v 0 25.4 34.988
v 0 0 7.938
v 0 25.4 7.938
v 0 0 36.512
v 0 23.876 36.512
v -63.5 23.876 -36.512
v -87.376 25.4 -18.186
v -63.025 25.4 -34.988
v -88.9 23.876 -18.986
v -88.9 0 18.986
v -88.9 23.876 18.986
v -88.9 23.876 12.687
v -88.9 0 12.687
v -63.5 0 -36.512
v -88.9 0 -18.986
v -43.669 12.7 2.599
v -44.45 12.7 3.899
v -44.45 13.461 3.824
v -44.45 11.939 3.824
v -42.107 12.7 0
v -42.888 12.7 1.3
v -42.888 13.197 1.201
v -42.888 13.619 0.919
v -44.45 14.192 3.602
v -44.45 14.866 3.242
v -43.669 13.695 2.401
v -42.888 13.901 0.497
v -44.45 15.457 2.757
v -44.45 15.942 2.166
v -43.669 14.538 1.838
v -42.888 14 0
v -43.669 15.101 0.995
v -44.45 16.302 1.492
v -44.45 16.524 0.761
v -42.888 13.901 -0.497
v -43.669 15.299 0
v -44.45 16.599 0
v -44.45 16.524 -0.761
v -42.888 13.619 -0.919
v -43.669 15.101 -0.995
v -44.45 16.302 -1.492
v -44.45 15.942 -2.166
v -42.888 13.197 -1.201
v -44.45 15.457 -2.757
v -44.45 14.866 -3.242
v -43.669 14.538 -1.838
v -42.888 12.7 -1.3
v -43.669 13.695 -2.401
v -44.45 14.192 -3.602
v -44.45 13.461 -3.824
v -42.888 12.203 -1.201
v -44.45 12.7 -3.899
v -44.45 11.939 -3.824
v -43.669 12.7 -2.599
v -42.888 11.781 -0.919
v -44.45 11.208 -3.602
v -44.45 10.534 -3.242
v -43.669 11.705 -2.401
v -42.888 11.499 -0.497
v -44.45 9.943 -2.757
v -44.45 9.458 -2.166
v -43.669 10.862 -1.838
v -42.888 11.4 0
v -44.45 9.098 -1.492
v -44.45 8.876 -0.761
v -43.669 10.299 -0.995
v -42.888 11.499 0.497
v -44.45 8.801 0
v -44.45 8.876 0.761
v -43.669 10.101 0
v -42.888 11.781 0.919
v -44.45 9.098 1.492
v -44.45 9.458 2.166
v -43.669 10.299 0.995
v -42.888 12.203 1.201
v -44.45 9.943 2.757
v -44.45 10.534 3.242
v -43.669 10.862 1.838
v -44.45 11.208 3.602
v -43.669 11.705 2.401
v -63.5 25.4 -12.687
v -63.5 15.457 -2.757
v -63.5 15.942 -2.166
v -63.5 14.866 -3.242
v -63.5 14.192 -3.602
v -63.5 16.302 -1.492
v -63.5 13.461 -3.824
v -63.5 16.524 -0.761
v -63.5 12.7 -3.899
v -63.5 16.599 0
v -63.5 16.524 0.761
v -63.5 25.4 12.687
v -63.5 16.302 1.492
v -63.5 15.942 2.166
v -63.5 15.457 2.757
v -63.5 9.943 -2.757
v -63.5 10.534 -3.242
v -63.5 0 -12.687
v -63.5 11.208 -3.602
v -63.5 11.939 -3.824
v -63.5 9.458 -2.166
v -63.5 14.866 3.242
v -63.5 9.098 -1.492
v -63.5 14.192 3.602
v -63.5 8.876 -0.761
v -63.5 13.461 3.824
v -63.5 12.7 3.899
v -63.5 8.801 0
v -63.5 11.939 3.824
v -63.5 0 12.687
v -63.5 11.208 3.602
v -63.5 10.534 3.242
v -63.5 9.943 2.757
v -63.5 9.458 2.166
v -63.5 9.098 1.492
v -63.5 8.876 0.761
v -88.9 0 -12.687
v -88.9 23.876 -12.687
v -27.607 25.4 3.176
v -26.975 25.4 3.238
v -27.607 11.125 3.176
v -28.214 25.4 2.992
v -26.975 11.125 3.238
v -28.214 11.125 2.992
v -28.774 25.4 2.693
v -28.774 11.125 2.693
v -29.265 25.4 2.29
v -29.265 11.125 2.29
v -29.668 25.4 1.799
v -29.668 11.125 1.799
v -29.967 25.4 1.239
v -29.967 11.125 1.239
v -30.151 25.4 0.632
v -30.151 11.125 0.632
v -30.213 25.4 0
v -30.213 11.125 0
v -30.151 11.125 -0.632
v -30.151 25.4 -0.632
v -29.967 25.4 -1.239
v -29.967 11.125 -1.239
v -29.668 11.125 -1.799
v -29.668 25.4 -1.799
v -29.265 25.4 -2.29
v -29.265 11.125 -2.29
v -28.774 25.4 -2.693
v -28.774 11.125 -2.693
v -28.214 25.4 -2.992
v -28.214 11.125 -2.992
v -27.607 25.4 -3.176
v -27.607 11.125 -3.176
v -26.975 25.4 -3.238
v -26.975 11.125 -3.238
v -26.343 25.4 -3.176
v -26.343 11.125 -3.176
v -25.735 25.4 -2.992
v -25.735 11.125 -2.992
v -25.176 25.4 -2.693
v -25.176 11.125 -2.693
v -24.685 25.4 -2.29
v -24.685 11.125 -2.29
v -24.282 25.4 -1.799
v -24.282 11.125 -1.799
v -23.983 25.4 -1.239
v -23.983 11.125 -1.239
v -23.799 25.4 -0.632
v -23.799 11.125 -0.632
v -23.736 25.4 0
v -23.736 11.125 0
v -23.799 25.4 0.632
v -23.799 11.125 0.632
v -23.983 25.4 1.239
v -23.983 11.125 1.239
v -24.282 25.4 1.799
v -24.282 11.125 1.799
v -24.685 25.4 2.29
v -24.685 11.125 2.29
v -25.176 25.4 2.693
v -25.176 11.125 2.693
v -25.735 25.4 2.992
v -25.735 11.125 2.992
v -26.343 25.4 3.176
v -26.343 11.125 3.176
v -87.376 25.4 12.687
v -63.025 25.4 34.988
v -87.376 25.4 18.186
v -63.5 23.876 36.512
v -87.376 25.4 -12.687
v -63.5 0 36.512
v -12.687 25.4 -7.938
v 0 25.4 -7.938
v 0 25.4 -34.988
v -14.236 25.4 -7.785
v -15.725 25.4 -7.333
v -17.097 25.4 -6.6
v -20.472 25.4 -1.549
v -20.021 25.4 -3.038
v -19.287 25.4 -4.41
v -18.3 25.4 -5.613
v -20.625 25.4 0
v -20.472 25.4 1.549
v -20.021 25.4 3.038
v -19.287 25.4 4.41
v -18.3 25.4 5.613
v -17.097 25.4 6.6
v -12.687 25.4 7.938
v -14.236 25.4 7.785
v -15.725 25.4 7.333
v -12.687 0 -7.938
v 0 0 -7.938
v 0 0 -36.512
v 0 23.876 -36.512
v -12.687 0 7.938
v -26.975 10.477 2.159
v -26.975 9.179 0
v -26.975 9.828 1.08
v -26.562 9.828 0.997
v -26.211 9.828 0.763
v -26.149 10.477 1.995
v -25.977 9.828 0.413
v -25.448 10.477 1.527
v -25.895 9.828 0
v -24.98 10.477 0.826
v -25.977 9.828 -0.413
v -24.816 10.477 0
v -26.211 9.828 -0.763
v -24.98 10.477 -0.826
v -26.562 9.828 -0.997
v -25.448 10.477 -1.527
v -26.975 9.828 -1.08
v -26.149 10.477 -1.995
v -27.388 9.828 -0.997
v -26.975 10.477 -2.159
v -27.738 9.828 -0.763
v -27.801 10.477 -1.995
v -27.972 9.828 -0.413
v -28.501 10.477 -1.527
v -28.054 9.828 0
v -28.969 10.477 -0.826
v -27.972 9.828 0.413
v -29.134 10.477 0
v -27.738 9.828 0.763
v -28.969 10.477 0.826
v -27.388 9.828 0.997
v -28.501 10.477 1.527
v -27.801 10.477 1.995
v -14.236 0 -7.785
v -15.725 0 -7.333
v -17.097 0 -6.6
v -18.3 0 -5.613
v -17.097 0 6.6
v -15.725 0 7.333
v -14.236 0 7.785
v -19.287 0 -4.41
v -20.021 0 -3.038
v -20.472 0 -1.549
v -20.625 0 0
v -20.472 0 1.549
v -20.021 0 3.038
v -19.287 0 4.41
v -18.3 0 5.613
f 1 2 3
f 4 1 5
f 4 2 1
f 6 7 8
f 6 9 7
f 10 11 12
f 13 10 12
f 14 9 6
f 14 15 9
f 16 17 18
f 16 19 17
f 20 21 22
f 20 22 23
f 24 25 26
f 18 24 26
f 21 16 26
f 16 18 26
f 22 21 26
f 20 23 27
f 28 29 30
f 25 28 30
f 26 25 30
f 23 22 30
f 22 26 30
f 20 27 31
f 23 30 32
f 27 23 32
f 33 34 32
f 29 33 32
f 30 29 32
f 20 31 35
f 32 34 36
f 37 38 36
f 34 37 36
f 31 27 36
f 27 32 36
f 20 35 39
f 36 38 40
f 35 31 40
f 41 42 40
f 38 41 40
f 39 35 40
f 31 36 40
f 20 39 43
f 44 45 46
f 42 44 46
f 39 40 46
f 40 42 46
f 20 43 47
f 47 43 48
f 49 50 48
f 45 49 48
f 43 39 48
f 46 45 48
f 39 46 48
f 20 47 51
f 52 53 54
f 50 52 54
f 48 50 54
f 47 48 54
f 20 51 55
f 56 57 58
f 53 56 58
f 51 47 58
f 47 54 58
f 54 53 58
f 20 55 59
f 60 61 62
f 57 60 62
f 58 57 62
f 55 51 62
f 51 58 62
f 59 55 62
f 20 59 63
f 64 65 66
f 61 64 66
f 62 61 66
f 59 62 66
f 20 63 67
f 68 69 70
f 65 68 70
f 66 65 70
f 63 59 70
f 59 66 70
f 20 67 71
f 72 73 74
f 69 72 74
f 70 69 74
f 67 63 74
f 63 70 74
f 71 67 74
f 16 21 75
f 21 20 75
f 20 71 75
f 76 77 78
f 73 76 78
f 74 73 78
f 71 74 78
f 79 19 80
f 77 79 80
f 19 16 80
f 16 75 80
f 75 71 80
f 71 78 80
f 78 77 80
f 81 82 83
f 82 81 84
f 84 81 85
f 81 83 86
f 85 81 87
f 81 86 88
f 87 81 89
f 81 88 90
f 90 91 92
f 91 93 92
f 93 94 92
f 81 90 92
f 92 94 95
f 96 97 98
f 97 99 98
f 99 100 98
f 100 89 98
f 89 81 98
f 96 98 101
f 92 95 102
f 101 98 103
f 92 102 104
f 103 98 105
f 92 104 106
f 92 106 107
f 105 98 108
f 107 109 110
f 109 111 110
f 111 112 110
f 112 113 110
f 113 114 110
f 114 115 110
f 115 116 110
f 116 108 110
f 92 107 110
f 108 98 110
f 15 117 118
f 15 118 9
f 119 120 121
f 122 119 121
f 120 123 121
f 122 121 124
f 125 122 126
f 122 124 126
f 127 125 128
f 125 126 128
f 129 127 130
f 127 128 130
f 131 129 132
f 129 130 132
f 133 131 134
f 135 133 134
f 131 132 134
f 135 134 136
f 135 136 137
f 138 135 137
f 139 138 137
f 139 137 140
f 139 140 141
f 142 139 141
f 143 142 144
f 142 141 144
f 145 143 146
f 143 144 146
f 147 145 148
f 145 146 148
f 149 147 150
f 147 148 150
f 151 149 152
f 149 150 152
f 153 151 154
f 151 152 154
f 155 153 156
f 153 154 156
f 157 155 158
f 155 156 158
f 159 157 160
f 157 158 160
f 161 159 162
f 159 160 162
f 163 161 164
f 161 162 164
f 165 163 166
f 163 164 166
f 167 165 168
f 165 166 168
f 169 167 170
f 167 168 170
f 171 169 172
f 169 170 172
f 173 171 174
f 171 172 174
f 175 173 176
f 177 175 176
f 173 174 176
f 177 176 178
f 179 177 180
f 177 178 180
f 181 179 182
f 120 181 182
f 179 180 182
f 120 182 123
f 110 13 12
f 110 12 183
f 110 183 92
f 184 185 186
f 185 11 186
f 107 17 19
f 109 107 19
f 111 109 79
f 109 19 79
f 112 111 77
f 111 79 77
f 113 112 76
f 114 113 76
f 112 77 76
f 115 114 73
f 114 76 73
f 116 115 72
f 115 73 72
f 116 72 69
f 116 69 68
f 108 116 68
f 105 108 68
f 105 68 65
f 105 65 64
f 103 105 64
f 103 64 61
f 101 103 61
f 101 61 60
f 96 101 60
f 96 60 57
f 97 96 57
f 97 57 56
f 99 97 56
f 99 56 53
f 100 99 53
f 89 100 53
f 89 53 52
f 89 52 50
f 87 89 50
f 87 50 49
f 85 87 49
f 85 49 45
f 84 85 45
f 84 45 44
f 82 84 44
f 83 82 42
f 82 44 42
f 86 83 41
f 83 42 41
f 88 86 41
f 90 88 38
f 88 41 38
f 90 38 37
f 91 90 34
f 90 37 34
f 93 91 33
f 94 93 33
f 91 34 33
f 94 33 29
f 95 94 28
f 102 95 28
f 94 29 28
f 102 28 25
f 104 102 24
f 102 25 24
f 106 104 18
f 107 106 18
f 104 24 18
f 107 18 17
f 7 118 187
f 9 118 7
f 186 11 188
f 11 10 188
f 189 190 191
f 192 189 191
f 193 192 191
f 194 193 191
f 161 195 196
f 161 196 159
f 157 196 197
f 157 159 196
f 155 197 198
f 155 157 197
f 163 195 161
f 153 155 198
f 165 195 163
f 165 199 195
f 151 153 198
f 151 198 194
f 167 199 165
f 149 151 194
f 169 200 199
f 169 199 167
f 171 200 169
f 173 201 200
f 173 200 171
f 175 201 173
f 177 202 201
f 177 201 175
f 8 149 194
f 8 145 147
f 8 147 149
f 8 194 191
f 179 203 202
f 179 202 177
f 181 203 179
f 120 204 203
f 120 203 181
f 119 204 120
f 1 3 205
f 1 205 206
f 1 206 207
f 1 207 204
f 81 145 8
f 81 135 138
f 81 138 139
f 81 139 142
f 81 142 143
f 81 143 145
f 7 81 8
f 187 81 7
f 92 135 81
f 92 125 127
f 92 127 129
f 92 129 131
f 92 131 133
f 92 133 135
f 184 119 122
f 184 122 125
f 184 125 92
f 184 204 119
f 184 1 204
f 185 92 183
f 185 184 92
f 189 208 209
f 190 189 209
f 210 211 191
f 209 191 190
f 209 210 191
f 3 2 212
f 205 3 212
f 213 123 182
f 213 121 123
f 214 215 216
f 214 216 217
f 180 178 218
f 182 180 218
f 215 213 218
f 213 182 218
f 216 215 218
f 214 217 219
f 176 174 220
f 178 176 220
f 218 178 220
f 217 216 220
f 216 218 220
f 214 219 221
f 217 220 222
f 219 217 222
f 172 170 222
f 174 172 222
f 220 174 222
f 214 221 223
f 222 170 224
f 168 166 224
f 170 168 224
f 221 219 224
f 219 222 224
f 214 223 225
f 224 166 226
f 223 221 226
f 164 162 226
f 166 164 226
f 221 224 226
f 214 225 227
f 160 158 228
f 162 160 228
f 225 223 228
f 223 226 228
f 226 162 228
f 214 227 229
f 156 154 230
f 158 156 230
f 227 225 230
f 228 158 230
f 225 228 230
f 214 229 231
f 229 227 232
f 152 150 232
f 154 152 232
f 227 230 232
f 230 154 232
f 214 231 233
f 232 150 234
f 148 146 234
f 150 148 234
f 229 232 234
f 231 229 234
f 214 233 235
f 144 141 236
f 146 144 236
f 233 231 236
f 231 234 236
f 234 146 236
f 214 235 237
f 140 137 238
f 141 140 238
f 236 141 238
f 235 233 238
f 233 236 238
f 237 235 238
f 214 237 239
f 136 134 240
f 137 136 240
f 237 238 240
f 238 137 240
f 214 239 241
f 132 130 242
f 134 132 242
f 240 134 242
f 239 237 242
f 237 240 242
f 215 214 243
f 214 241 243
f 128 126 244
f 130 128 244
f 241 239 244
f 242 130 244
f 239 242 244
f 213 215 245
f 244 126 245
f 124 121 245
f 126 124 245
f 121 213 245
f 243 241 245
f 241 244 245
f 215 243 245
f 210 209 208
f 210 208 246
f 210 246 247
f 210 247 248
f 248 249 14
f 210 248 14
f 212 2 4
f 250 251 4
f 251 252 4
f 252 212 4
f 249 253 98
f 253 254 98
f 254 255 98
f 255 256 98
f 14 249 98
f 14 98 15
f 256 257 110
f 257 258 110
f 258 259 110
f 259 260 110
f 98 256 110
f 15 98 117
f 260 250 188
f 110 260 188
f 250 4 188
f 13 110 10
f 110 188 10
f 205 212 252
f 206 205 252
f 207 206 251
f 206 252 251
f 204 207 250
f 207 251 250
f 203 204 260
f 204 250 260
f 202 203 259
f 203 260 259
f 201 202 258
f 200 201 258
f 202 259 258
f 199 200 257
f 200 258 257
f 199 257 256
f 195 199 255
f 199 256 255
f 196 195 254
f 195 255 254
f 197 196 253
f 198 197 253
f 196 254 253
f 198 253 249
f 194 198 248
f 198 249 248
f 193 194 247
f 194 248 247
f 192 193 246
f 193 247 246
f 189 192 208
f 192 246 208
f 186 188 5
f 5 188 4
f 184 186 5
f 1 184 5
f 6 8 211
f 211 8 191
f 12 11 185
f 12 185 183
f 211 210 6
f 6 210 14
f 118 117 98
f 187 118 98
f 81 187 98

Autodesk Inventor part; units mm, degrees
ref_plane "YZ Plane" through (0, 0, 0) normal (1, 0, 0) x (0, 1, 0)
ref_plane "XZ Plane" through (0, 0, 0) normal (0, 1, 0) x (-1, 0, 0)
ref_plane "XY Plane" through (0, 0, 0) normal (0, 0, 1) x (1, 0, 0)
sketch "Sketch1" plane through (0, 0, 0) normal (0, 1, 0) x (-1, 0, 0)
  line L0 (0, -51.1175) -> (0, 51.1175) projected
  line L1 (-17.78, 0) -> (106.68, 0) projected
  line L2 (106.68, 0) -> (-17.78, 0) projected
  line L3 (0, -51.1175) -> (0, 51.1175) projected
  line L4 (63.5, 36.5125) -> (0, 36.5125)
  line L5 (0, -36.5125) -> (63.5, -36.5125)
  line L6 (0, 36.5125) -> (63.5, 36.5125)
  line L7 (88.9, 18.9865) -> (63.5, 36.5125)
  line L8 (88.9, 12.6873) -> (63.5, 12.6873)
  line L9 (63.5, 12.6873) -> (63.5, 0)
  line L10 (88.9, -18.9865) -> (63.5, -36.5125)
  line L11 (88.9, -12.6873) -> (63.5, -12.6873)
  line L12 (63.5, -12.6873) -> (63.5, 0)
  line L13 (88.9, 18.9865) -> (88.9, 12.6873)
  line L14 (88.9, -12.6873) -> (88.9, -18.9865)
  line L15 (0, 7.9375) -> (12.6873, 7.9375)
  line L16 (12.6873, -7.9375) -> (0, -7.9375)
  arc A0 (12.6873, -7.9375) -> (12.6873, 7.9375) centre (12.6873, 0) ccw
  line L17 (0, 36.5125) -> (0, 7.9375)
  line L18 (0, -7.9375) -> (0, -36.5125)
  point P0 (0, 0)
  point P1 (0, 0)
  point P2 (0, 36.5125)
  point P3 (0, -7.9375)
  dimension "d1" = 73.025
  dimension "d2" = 63.5
  dimension "d4" = 17.526
  dimension "d5" = 88.9
  dimension "d7" = 23.8252
  dimension "d10" = 12.6873
  dimension "d11" = 15.875
  dimension "d12" = 36.5125
extrude "Extrusion1" add sketch "Sketch1" along normal blind 25.4 contours L0 L16 A0 L1 L12 L11 L14 L10 L5 | L0 L4 L7 L13 L8 L9 L1 A0 L15
chamfer "Chamfer1" distance 1.524 angle 45 6 edges at (-31.75, 25.4, 36.5125) (-76.2, 25.4, 27.7495) (-88.9, 25.4, 15.8369) (-31.75, 25.4, -36.5125) (-76.2, 25.4, -27.7495) (-88.9, 25.4, -15.8369)
sketch "Sketch2" plane through (0, 25.4, 0) normal (0, 1, 0) x (1, 0, 0)
  point P0 (0, 0)
  point P1 (-26.9748, 0)
  dimension "d18" = 26.9748
hole "Hole1" at (-26.9748, 25.4, 0) direction (0, -1, 0) diameter 6.477 depth 14.2748 tip angle 118
sketch "Sketch3" plane through (-63.5, 0, -12.6873) normal (-1, 0, 0) x (0, 0, 1)
  line L0 (0, 0) -> (25.3746, 0) projected
  point P0 (12.6873, 0)
  point P1 (12.6873, 12.7)
  point P2 (12.6873, 0)
  dimension "d26" = 12.7
hole "Hole2" at (-63.5, 12.7, 0) direction (1, 0, 0) diameter 7.7978 depth 19.05 tip angle 118 thread size "3/8-16 UNC" class "2B" standard "ANSI Unified Screw Threads"
properties part number "Ch7(5) Part 1 Base"
